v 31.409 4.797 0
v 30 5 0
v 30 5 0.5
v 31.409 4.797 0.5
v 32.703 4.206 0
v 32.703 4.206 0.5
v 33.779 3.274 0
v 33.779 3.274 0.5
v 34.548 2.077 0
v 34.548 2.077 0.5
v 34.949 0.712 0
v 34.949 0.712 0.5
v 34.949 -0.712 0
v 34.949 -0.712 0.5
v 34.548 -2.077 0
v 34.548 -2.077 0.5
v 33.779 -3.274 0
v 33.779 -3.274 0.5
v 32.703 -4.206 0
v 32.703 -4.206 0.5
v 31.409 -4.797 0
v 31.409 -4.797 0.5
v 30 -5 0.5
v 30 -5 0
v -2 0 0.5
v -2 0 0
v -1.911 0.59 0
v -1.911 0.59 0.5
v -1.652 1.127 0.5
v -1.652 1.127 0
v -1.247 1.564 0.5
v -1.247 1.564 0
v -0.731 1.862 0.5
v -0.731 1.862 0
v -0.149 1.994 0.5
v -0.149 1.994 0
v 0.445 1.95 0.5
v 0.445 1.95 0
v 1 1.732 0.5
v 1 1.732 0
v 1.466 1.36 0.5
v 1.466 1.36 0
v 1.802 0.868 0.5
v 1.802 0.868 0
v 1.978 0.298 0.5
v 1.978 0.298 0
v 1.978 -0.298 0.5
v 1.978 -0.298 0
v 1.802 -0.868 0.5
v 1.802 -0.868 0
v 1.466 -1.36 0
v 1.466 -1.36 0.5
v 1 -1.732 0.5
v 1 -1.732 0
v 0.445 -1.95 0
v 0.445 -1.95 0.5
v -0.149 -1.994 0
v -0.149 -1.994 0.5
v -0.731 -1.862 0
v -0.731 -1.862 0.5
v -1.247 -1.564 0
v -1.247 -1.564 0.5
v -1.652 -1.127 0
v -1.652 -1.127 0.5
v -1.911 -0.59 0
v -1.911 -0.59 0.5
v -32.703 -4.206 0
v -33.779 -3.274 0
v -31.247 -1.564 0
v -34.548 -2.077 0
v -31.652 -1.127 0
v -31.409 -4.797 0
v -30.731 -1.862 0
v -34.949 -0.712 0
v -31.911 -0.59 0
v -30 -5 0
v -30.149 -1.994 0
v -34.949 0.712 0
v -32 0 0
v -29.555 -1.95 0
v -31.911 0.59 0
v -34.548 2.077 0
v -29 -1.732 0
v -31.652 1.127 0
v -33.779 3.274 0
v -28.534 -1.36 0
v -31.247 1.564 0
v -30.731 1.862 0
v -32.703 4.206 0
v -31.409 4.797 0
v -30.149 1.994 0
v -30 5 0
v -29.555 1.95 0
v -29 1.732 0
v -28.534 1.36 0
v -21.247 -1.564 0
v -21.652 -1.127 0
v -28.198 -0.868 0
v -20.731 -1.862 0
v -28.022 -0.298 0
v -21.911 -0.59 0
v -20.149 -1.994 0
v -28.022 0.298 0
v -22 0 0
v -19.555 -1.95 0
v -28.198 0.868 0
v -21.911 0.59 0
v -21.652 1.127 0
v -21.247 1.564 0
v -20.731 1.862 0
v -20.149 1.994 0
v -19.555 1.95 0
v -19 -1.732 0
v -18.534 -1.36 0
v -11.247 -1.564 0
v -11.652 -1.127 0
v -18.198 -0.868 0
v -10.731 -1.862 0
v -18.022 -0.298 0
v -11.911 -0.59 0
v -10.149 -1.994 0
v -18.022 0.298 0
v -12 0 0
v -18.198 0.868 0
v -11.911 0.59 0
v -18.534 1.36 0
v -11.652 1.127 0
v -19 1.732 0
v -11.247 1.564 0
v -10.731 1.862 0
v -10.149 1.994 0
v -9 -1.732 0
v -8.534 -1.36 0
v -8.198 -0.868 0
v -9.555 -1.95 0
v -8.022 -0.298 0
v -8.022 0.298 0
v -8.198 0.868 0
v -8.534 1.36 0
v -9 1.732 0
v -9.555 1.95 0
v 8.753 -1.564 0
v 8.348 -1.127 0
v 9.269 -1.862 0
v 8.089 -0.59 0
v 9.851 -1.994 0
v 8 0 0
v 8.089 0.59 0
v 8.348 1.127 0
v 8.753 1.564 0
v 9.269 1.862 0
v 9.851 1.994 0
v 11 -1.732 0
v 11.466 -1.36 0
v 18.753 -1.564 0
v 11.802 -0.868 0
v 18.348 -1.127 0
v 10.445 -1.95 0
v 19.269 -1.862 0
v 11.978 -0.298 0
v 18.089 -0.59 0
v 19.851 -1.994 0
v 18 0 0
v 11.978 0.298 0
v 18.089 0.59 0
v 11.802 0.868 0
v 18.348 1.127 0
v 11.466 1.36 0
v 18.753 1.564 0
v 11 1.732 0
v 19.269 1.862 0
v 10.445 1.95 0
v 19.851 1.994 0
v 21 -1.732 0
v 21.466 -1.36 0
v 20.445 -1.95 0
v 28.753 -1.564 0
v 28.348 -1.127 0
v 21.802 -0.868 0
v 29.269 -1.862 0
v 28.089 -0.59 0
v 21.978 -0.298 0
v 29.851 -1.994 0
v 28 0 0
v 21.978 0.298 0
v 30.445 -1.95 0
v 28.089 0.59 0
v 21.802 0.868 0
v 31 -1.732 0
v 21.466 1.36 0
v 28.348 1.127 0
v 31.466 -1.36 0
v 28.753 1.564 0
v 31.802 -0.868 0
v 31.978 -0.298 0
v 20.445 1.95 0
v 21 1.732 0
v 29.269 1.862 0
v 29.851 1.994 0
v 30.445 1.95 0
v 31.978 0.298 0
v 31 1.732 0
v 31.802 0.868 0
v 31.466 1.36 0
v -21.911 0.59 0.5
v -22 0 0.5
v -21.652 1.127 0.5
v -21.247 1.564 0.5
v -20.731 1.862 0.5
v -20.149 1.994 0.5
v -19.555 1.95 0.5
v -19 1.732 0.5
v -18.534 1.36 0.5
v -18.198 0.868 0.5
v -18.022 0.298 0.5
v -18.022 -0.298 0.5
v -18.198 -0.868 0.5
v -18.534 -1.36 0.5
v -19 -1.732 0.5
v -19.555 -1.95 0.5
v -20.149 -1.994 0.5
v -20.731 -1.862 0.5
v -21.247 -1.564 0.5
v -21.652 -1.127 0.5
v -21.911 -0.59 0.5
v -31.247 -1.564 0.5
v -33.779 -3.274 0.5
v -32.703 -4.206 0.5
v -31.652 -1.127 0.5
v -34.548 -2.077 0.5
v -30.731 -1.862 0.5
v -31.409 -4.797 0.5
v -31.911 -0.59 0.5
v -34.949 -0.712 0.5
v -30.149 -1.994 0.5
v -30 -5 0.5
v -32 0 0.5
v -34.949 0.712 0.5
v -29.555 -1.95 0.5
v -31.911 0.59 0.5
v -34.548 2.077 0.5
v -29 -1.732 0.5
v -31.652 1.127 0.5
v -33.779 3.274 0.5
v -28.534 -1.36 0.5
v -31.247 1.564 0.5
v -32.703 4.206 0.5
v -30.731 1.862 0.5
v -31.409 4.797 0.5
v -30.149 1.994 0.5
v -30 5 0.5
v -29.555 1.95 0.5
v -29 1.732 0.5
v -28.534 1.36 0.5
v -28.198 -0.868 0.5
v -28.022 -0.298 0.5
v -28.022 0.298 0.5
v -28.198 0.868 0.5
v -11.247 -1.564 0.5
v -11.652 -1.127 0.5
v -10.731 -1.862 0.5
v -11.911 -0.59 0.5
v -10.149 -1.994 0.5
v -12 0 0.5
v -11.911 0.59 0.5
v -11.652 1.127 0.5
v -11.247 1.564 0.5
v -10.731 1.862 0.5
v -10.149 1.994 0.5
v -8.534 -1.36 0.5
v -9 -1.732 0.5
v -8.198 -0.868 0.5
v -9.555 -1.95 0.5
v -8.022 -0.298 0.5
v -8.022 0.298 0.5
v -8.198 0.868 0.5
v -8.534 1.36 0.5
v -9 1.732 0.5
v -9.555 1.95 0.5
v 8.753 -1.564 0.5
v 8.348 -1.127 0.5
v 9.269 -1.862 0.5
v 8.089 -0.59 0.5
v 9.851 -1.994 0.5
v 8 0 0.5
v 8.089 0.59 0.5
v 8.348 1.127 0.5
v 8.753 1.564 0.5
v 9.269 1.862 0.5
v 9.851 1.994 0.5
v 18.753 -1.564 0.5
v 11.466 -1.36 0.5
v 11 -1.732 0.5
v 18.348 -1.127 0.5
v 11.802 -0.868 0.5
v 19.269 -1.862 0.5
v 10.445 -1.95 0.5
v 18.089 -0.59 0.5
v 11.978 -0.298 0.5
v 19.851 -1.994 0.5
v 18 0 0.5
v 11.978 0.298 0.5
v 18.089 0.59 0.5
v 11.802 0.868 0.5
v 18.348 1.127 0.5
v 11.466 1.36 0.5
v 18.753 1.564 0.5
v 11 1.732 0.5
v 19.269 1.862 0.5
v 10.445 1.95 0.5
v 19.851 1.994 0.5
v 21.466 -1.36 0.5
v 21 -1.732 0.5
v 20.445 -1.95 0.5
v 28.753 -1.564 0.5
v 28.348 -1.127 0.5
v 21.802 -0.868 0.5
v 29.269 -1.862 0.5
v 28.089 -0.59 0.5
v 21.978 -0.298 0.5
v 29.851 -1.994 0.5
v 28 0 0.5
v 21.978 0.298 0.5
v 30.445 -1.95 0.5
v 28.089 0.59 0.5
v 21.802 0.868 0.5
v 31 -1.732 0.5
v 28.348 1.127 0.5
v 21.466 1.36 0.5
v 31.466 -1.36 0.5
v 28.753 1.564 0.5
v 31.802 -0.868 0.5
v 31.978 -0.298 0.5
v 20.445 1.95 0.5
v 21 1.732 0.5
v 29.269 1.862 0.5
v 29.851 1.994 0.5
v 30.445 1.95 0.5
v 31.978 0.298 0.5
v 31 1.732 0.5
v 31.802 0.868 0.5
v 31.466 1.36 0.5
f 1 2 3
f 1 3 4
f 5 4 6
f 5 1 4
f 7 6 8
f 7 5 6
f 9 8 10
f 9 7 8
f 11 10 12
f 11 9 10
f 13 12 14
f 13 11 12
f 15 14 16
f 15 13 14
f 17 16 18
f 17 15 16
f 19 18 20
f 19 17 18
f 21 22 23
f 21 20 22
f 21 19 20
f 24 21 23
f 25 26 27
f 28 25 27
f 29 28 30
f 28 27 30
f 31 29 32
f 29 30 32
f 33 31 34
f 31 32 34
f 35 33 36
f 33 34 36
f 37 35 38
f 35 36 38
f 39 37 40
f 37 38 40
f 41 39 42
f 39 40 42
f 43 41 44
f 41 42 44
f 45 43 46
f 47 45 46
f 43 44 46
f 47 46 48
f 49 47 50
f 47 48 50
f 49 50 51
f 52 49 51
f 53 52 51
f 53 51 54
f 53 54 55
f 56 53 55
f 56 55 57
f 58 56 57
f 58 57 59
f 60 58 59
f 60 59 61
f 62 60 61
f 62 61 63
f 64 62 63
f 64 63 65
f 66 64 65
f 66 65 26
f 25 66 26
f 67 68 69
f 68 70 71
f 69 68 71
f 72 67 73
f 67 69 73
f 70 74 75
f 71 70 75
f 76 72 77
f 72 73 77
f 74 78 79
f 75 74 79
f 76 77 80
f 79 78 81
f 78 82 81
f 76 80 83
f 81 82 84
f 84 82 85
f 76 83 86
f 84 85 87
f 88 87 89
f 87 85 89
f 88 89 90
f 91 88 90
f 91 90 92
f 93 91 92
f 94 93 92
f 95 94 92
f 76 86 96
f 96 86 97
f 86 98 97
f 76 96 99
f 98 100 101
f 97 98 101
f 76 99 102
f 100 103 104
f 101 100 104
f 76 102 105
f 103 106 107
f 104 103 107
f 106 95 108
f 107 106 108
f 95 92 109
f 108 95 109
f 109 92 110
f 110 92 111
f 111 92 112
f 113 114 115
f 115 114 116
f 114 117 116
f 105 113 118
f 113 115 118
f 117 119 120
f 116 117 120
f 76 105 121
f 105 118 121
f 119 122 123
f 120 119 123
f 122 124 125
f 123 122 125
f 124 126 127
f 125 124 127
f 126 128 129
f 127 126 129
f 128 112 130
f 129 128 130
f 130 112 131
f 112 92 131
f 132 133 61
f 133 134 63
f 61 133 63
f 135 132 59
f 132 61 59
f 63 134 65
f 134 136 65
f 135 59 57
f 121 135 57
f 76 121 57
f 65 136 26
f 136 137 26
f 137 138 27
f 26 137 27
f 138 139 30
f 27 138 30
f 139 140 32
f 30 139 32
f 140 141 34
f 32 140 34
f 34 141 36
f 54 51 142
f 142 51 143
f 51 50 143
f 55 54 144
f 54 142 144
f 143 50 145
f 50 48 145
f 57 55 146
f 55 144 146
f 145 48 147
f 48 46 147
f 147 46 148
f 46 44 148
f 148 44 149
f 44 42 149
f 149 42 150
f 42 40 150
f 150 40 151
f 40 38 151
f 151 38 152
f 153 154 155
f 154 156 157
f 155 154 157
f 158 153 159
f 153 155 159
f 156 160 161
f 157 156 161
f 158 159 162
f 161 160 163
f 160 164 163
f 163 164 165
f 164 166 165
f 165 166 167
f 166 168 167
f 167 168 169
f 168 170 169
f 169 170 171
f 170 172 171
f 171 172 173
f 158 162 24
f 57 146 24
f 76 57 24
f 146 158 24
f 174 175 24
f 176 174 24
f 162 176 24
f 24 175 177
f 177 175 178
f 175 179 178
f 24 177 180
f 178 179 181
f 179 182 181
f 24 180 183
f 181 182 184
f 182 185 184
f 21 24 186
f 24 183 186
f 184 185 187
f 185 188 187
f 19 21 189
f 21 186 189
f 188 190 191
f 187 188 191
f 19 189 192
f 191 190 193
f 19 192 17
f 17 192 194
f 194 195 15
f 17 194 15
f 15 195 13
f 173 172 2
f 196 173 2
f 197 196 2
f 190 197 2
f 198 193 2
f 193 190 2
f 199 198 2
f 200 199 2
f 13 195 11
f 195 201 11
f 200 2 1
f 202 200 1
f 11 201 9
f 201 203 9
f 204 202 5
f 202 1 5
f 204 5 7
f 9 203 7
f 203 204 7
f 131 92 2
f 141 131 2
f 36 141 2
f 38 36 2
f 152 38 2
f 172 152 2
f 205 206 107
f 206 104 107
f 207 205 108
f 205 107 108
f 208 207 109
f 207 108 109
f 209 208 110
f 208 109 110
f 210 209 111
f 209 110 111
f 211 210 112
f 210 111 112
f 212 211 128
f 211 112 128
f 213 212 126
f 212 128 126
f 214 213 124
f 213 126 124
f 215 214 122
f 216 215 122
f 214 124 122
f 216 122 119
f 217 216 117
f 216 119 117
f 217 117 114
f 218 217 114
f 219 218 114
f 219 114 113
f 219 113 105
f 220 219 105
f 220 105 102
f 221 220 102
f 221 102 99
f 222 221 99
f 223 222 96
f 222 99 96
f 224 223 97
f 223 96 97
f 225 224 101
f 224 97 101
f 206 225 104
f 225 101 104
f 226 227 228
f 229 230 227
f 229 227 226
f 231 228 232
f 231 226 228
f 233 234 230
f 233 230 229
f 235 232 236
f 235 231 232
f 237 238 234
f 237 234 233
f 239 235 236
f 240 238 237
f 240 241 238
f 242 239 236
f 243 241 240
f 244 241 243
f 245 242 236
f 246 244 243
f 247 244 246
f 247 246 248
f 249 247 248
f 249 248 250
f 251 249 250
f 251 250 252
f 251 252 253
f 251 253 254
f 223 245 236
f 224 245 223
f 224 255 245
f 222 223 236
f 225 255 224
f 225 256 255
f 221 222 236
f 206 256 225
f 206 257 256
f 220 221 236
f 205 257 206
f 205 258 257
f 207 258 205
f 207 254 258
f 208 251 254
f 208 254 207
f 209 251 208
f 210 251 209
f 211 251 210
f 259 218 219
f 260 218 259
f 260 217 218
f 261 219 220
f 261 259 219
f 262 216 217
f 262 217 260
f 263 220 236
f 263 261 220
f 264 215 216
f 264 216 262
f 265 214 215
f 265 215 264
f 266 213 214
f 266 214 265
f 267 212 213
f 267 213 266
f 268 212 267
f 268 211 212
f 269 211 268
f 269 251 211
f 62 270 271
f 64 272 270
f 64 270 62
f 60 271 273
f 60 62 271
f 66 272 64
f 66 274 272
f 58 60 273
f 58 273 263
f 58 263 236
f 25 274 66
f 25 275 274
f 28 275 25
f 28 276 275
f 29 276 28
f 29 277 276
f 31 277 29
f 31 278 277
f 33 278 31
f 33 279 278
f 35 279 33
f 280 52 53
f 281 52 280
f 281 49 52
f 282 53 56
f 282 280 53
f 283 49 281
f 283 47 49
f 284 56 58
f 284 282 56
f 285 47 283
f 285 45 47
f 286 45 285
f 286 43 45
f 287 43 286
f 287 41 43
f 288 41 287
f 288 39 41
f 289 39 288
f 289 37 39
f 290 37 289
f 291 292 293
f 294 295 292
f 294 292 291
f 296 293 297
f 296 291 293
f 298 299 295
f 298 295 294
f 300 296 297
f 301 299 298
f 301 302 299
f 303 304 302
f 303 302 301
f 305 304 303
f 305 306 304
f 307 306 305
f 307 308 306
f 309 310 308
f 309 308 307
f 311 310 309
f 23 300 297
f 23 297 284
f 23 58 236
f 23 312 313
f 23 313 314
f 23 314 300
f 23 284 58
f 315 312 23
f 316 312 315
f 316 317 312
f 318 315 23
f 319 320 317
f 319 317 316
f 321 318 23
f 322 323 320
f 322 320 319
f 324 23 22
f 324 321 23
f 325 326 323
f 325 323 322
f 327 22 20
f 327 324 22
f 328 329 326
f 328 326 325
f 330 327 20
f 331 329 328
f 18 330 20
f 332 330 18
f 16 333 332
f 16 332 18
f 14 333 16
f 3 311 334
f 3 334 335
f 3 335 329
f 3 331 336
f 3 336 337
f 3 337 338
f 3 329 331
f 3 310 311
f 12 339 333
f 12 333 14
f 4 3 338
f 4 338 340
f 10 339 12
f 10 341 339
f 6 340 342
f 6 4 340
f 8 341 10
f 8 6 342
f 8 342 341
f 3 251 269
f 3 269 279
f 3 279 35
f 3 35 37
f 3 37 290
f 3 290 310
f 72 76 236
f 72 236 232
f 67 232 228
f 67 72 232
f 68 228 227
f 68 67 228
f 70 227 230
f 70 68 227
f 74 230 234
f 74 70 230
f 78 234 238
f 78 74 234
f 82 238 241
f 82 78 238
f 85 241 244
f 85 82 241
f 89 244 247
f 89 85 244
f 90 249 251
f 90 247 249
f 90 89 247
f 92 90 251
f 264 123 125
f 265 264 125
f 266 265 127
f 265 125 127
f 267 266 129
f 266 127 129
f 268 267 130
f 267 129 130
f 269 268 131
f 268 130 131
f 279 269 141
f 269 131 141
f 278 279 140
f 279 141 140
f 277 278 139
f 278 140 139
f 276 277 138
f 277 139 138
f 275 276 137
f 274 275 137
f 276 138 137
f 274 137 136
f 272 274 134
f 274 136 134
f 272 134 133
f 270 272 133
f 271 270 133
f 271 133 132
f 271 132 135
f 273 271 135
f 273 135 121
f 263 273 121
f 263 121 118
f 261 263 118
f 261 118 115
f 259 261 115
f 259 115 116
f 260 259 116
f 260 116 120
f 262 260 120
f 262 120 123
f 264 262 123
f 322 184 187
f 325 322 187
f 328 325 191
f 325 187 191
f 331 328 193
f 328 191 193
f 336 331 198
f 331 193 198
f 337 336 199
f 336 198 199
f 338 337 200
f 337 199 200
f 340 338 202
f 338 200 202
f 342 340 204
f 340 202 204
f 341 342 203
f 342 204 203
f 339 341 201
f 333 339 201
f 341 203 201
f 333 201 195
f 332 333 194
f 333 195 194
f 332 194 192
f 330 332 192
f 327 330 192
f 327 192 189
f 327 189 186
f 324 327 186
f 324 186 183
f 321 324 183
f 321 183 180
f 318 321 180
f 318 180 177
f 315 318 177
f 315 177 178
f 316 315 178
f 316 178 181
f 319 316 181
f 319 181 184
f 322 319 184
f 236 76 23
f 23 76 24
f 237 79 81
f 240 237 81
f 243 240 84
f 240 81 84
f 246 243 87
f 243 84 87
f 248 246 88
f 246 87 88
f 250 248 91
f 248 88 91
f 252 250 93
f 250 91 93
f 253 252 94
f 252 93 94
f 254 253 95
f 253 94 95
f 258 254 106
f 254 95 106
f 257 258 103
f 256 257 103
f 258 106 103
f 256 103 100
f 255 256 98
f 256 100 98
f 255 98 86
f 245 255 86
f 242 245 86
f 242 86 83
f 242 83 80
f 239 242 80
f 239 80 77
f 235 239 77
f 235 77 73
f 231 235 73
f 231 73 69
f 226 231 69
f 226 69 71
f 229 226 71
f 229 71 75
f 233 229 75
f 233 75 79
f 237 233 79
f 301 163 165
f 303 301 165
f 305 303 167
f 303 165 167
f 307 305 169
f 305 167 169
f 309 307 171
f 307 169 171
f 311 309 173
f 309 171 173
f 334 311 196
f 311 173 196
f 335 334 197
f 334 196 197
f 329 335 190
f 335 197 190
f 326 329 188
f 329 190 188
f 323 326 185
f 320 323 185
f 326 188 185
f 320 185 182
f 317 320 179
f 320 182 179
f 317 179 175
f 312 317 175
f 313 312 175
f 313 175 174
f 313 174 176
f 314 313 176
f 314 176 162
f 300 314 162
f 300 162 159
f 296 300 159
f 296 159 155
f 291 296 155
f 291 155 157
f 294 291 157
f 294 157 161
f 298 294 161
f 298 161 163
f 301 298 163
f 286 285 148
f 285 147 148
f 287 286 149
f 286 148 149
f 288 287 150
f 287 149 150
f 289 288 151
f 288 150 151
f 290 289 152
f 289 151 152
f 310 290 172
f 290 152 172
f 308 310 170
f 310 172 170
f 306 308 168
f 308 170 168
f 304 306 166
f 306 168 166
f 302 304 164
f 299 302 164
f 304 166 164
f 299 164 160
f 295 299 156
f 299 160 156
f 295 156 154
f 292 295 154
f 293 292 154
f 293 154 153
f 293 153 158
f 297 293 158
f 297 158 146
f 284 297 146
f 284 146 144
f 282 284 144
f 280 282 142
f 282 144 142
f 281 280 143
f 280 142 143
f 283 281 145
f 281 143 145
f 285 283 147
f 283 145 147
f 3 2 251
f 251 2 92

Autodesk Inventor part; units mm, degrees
ref_plane "YZ Plane" through (0, 0, 0) normal (1, 0, 0) x (0, 1, 0)
ref_plane "XZ Plane" through (0, 0, 0) normal (0, 1, 0) x (-1, 0, 0)
ref_plane "XY Plane" through (0, 0, 0) normal (0, 0, 1) x (1, 0, 0)
sketch "Náčrt1" plane through (0, 0, 0) normal (0, 0, 1) x (1, 0, 0)
  line L0 (-30, 0) -> (30, 0) construction
  line L1 (-30, -5) -> (30, -5)
  line L2 (30, 5) -> (-30, 5)
  arc A0 (-30, 5) -> (-30, -5) centre (-30, 0) ccw
  arc A1 (30, -5) -> (30, 5) centre (30, 0) ccw
  point P0 (0, 0)
  point P1 (35, 0)
  dimension "d0" = 35
  dimension "d1" = 5
extrude "Vysunutí1" add sketch "Náčrt1" along normal blind 0.5
sketch "Náčrt2" plane through (0, 0, 0) normal (0, 0, -1) x (-1, 0, 0)
  arc A0 (30, -5) -> (30, 5) centre (30, 0) ccw projected
  circle A1 centre (30, 0) radius 2
  point P0 (0, 0)
  dimension "d4" = 4
extrude "Vysunutí2" cut sketch "Náčrt2" against normal through all
pattern_linear "Obdélníkové pole1" count 7 spacing 10 along (1, 0, 0) of "Vysunutí2"
properties part number "1007"
